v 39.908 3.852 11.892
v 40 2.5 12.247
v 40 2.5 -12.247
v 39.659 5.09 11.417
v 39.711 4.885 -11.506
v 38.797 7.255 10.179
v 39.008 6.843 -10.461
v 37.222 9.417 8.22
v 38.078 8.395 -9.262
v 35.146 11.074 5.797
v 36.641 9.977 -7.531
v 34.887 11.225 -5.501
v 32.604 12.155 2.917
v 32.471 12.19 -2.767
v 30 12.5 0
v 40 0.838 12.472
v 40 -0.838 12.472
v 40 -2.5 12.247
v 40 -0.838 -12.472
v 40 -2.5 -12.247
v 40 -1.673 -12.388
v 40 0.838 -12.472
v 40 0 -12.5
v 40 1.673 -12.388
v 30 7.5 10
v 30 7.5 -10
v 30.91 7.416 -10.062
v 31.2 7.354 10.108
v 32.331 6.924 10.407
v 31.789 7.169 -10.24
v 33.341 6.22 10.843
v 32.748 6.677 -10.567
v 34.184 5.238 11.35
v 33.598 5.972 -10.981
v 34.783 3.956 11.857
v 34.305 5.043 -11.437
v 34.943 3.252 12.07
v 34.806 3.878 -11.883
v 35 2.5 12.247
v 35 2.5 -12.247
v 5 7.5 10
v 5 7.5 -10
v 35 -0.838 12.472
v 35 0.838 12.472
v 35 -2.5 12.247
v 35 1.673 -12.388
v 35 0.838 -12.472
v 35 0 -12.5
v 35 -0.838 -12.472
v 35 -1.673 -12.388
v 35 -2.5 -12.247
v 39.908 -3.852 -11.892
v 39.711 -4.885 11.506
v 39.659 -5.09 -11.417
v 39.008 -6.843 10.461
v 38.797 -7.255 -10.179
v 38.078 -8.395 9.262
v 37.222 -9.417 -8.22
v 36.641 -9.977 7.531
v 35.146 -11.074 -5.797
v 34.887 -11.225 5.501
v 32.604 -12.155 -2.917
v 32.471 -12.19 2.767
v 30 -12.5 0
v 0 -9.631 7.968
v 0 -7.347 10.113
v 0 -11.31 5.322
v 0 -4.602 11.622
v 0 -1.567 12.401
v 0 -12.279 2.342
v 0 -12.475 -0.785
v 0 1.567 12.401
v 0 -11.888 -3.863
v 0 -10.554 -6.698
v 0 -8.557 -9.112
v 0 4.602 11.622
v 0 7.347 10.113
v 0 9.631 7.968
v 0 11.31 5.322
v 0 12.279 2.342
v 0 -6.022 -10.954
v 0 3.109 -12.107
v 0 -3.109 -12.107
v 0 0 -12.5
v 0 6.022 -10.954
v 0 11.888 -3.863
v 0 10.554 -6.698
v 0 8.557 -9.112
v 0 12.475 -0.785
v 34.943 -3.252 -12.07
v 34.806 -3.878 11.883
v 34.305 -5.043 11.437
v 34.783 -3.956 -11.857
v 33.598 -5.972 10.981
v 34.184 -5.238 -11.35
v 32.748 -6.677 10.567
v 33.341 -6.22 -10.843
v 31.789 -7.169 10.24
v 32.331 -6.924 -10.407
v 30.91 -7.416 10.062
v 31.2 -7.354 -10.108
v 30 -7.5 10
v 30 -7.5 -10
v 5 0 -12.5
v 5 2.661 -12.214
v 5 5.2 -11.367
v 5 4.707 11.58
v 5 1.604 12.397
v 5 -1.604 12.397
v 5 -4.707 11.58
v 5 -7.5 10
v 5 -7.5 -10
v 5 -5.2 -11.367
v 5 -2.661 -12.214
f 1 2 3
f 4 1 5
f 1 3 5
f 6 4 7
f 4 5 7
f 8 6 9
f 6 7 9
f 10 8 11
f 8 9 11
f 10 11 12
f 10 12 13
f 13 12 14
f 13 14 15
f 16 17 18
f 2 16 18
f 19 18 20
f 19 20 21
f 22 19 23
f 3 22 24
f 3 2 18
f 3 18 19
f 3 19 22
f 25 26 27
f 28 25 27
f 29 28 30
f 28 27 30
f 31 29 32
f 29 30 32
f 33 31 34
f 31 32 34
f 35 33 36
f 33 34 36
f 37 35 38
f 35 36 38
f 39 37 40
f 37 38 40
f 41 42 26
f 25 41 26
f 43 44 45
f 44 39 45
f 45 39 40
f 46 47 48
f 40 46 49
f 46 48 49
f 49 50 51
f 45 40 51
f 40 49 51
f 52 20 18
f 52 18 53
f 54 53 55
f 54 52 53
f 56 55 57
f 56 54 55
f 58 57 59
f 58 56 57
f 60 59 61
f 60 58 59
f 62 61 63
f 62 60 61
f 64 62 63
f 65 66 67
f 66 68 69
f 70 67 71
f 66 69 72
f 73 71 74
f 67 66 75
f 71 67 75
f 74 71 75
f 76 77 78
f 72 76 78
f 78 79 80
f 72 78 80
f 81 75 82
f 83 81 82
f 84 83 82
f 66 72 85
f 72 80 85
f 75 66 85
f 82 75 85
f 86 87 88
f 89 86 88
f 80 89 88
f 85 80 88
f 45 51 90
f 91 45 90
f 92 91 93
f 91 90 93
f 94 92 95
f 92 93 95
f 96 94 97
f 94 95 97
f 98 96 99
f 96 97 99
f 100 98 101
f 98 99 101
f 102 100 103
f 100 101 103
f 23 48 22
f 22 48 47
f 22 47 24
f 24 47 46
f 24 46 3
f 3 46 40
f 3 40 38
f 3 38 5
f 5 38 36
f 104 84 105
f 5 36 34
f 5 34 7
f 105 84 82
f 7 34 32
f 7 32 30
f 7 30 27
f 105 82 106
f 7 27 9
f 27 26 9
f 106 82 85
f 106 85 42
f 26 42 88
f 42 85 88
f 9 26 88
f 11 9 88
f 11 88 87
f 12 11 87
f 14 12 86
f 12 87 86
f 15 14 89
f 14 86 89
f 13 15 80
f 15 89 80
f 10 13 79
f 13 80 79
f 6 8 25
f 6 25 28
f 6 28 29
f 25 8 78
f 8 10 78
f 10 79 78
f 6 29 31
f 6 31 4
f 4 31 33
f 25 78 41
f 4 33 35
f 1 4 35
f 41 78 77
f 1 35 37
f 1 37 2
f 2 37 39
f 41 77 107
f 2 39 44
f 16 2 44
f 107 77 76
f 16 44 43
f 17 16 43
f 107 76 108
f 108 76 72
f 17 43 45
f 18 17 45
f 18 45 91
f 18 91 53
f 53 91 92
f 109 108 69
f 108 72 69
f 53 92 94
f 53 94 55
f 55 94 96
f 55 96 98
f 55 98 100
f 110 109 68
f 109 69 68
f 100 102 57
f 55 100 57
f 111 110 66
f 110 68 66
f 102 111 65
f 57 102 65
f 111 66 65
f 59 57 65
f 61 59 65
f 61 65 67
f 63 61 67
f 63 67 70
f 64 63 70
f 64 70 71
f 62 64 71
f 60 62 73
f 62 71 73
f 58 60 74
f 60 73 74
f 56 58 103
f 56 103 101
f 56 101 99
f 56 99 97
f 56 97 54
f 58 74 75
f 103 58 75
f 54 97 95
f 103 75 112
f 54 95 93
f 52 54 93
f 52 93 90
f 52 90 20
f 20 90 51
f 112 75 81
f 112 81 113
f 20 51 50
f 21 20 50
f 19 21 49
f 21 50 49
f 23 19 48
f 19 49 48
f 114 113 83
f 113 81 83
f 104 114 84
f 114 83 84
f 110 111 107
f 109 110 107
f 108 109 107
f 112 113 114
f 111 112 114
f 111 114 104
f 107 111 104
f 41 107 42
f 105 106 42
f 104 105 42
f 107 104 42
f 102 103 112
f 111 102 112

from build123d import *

# Parameters (mm, degrees)
SKETCH1_R               = 12.5
BOSS_EXTRUDE4_DEPTH     = 40
CUT_EXTRUDE2_DEPTH      = 44.732139211
CUT_EXTRUDE2_DEPTH_BACK = 44.732139211
CUT_EXTRUDE6_DEPTH      = 44.73213936
CUT_EXTRUDE6_DEPTH_BACK = 44.73213936
CUT_EXTRUDE7_DEPTH      = 44.73213936
CUT_EXTRUDE7_DEPTH_BACK = 44.73213936


with BuildPart() as part:
    # Sketch1 → Boss-Extrude4 (new body)
    with BuildSketch(Plane(origin=(0, 0, 0), x_dir=(0, 0, -1), z_dir=(1, 0, 0))):
        Circle(SKETCH1_R)
    extrude(amount=BOSS_EXTRUDE4_DEPTH)

    # Sketch2 → Cut-Extrude2 (cut, two sides: drawn at the far end of the back side and taken through both)
    with BuildSketch(Plane.XY.offset(-CUT_EXTRUDE2_DEPTH_BACK)):
        with BuildLine():
            Line((5, 0), (5, 7.5))
            Line((5, 7.5), (30, 7.5))
            ThreePointArc((30, 7.5), (33.535533906, 6.035533906), (35, 2.5))
            Line((35, 2.5), (35, -2.5))
            ThreePointArc((35, -2.5), (33.535533906, -6.035533906), (30, -7.5))
            Line((30, -7.5), (5, -7.5))
            Line((5, -7.5), (5, 0))
        make_face()
    extrude(amount=CUT_EXTRUDE2_DEPTH + CUT_EXTRUDE2_DEPTH_BACK, mode=Mode.SUBTRACT)

    # Sketch4 → Cut-Extrude6 (cut, two sides: drawn at the far end of the back side and taken through both)
    with BuildSketch(Plane.XY.offset(-CUT_EXTRUDE6_DEPTH_BACK)):
        with BuildLine():
            Line((30, 12.5), (40, 12.5))
            Line((40, 12.5), (40, 2.5))
            ThreePointArc((40, 2.5), (37.071067812, 9.571067812), (30, 12.5))
        make_face()
    extrude(amount=CUT_EXTRUDE6_DEPTH + CUT_EXTRUDE6_DEPTH_BACK, mode=Mode.SUBTRACT)

    # Sketch5 → Cut-Extrude7 (cut, two sides: drawn at the far end of the back side and taken through both)
    with BuildSketch(Plane.XY.offset(-CUT_EXTRUDE7_DEPTH_BACK)):
        with BuildLine():
            Line((30, -12.5), (40, -12.5))
            Line((40, -12.5), (40, -2.5))
            ThreePointArc((40, -2.5), (37.071067812, -9.571067812), (30, -12.5))
        make_face()
    extrude(amount=CUT_EXTRUDE7_DEPTH + CUT_EXTRUDE7_DEPTH_BACK, mode=Mode.SUBTRACT)


solid = part.part
